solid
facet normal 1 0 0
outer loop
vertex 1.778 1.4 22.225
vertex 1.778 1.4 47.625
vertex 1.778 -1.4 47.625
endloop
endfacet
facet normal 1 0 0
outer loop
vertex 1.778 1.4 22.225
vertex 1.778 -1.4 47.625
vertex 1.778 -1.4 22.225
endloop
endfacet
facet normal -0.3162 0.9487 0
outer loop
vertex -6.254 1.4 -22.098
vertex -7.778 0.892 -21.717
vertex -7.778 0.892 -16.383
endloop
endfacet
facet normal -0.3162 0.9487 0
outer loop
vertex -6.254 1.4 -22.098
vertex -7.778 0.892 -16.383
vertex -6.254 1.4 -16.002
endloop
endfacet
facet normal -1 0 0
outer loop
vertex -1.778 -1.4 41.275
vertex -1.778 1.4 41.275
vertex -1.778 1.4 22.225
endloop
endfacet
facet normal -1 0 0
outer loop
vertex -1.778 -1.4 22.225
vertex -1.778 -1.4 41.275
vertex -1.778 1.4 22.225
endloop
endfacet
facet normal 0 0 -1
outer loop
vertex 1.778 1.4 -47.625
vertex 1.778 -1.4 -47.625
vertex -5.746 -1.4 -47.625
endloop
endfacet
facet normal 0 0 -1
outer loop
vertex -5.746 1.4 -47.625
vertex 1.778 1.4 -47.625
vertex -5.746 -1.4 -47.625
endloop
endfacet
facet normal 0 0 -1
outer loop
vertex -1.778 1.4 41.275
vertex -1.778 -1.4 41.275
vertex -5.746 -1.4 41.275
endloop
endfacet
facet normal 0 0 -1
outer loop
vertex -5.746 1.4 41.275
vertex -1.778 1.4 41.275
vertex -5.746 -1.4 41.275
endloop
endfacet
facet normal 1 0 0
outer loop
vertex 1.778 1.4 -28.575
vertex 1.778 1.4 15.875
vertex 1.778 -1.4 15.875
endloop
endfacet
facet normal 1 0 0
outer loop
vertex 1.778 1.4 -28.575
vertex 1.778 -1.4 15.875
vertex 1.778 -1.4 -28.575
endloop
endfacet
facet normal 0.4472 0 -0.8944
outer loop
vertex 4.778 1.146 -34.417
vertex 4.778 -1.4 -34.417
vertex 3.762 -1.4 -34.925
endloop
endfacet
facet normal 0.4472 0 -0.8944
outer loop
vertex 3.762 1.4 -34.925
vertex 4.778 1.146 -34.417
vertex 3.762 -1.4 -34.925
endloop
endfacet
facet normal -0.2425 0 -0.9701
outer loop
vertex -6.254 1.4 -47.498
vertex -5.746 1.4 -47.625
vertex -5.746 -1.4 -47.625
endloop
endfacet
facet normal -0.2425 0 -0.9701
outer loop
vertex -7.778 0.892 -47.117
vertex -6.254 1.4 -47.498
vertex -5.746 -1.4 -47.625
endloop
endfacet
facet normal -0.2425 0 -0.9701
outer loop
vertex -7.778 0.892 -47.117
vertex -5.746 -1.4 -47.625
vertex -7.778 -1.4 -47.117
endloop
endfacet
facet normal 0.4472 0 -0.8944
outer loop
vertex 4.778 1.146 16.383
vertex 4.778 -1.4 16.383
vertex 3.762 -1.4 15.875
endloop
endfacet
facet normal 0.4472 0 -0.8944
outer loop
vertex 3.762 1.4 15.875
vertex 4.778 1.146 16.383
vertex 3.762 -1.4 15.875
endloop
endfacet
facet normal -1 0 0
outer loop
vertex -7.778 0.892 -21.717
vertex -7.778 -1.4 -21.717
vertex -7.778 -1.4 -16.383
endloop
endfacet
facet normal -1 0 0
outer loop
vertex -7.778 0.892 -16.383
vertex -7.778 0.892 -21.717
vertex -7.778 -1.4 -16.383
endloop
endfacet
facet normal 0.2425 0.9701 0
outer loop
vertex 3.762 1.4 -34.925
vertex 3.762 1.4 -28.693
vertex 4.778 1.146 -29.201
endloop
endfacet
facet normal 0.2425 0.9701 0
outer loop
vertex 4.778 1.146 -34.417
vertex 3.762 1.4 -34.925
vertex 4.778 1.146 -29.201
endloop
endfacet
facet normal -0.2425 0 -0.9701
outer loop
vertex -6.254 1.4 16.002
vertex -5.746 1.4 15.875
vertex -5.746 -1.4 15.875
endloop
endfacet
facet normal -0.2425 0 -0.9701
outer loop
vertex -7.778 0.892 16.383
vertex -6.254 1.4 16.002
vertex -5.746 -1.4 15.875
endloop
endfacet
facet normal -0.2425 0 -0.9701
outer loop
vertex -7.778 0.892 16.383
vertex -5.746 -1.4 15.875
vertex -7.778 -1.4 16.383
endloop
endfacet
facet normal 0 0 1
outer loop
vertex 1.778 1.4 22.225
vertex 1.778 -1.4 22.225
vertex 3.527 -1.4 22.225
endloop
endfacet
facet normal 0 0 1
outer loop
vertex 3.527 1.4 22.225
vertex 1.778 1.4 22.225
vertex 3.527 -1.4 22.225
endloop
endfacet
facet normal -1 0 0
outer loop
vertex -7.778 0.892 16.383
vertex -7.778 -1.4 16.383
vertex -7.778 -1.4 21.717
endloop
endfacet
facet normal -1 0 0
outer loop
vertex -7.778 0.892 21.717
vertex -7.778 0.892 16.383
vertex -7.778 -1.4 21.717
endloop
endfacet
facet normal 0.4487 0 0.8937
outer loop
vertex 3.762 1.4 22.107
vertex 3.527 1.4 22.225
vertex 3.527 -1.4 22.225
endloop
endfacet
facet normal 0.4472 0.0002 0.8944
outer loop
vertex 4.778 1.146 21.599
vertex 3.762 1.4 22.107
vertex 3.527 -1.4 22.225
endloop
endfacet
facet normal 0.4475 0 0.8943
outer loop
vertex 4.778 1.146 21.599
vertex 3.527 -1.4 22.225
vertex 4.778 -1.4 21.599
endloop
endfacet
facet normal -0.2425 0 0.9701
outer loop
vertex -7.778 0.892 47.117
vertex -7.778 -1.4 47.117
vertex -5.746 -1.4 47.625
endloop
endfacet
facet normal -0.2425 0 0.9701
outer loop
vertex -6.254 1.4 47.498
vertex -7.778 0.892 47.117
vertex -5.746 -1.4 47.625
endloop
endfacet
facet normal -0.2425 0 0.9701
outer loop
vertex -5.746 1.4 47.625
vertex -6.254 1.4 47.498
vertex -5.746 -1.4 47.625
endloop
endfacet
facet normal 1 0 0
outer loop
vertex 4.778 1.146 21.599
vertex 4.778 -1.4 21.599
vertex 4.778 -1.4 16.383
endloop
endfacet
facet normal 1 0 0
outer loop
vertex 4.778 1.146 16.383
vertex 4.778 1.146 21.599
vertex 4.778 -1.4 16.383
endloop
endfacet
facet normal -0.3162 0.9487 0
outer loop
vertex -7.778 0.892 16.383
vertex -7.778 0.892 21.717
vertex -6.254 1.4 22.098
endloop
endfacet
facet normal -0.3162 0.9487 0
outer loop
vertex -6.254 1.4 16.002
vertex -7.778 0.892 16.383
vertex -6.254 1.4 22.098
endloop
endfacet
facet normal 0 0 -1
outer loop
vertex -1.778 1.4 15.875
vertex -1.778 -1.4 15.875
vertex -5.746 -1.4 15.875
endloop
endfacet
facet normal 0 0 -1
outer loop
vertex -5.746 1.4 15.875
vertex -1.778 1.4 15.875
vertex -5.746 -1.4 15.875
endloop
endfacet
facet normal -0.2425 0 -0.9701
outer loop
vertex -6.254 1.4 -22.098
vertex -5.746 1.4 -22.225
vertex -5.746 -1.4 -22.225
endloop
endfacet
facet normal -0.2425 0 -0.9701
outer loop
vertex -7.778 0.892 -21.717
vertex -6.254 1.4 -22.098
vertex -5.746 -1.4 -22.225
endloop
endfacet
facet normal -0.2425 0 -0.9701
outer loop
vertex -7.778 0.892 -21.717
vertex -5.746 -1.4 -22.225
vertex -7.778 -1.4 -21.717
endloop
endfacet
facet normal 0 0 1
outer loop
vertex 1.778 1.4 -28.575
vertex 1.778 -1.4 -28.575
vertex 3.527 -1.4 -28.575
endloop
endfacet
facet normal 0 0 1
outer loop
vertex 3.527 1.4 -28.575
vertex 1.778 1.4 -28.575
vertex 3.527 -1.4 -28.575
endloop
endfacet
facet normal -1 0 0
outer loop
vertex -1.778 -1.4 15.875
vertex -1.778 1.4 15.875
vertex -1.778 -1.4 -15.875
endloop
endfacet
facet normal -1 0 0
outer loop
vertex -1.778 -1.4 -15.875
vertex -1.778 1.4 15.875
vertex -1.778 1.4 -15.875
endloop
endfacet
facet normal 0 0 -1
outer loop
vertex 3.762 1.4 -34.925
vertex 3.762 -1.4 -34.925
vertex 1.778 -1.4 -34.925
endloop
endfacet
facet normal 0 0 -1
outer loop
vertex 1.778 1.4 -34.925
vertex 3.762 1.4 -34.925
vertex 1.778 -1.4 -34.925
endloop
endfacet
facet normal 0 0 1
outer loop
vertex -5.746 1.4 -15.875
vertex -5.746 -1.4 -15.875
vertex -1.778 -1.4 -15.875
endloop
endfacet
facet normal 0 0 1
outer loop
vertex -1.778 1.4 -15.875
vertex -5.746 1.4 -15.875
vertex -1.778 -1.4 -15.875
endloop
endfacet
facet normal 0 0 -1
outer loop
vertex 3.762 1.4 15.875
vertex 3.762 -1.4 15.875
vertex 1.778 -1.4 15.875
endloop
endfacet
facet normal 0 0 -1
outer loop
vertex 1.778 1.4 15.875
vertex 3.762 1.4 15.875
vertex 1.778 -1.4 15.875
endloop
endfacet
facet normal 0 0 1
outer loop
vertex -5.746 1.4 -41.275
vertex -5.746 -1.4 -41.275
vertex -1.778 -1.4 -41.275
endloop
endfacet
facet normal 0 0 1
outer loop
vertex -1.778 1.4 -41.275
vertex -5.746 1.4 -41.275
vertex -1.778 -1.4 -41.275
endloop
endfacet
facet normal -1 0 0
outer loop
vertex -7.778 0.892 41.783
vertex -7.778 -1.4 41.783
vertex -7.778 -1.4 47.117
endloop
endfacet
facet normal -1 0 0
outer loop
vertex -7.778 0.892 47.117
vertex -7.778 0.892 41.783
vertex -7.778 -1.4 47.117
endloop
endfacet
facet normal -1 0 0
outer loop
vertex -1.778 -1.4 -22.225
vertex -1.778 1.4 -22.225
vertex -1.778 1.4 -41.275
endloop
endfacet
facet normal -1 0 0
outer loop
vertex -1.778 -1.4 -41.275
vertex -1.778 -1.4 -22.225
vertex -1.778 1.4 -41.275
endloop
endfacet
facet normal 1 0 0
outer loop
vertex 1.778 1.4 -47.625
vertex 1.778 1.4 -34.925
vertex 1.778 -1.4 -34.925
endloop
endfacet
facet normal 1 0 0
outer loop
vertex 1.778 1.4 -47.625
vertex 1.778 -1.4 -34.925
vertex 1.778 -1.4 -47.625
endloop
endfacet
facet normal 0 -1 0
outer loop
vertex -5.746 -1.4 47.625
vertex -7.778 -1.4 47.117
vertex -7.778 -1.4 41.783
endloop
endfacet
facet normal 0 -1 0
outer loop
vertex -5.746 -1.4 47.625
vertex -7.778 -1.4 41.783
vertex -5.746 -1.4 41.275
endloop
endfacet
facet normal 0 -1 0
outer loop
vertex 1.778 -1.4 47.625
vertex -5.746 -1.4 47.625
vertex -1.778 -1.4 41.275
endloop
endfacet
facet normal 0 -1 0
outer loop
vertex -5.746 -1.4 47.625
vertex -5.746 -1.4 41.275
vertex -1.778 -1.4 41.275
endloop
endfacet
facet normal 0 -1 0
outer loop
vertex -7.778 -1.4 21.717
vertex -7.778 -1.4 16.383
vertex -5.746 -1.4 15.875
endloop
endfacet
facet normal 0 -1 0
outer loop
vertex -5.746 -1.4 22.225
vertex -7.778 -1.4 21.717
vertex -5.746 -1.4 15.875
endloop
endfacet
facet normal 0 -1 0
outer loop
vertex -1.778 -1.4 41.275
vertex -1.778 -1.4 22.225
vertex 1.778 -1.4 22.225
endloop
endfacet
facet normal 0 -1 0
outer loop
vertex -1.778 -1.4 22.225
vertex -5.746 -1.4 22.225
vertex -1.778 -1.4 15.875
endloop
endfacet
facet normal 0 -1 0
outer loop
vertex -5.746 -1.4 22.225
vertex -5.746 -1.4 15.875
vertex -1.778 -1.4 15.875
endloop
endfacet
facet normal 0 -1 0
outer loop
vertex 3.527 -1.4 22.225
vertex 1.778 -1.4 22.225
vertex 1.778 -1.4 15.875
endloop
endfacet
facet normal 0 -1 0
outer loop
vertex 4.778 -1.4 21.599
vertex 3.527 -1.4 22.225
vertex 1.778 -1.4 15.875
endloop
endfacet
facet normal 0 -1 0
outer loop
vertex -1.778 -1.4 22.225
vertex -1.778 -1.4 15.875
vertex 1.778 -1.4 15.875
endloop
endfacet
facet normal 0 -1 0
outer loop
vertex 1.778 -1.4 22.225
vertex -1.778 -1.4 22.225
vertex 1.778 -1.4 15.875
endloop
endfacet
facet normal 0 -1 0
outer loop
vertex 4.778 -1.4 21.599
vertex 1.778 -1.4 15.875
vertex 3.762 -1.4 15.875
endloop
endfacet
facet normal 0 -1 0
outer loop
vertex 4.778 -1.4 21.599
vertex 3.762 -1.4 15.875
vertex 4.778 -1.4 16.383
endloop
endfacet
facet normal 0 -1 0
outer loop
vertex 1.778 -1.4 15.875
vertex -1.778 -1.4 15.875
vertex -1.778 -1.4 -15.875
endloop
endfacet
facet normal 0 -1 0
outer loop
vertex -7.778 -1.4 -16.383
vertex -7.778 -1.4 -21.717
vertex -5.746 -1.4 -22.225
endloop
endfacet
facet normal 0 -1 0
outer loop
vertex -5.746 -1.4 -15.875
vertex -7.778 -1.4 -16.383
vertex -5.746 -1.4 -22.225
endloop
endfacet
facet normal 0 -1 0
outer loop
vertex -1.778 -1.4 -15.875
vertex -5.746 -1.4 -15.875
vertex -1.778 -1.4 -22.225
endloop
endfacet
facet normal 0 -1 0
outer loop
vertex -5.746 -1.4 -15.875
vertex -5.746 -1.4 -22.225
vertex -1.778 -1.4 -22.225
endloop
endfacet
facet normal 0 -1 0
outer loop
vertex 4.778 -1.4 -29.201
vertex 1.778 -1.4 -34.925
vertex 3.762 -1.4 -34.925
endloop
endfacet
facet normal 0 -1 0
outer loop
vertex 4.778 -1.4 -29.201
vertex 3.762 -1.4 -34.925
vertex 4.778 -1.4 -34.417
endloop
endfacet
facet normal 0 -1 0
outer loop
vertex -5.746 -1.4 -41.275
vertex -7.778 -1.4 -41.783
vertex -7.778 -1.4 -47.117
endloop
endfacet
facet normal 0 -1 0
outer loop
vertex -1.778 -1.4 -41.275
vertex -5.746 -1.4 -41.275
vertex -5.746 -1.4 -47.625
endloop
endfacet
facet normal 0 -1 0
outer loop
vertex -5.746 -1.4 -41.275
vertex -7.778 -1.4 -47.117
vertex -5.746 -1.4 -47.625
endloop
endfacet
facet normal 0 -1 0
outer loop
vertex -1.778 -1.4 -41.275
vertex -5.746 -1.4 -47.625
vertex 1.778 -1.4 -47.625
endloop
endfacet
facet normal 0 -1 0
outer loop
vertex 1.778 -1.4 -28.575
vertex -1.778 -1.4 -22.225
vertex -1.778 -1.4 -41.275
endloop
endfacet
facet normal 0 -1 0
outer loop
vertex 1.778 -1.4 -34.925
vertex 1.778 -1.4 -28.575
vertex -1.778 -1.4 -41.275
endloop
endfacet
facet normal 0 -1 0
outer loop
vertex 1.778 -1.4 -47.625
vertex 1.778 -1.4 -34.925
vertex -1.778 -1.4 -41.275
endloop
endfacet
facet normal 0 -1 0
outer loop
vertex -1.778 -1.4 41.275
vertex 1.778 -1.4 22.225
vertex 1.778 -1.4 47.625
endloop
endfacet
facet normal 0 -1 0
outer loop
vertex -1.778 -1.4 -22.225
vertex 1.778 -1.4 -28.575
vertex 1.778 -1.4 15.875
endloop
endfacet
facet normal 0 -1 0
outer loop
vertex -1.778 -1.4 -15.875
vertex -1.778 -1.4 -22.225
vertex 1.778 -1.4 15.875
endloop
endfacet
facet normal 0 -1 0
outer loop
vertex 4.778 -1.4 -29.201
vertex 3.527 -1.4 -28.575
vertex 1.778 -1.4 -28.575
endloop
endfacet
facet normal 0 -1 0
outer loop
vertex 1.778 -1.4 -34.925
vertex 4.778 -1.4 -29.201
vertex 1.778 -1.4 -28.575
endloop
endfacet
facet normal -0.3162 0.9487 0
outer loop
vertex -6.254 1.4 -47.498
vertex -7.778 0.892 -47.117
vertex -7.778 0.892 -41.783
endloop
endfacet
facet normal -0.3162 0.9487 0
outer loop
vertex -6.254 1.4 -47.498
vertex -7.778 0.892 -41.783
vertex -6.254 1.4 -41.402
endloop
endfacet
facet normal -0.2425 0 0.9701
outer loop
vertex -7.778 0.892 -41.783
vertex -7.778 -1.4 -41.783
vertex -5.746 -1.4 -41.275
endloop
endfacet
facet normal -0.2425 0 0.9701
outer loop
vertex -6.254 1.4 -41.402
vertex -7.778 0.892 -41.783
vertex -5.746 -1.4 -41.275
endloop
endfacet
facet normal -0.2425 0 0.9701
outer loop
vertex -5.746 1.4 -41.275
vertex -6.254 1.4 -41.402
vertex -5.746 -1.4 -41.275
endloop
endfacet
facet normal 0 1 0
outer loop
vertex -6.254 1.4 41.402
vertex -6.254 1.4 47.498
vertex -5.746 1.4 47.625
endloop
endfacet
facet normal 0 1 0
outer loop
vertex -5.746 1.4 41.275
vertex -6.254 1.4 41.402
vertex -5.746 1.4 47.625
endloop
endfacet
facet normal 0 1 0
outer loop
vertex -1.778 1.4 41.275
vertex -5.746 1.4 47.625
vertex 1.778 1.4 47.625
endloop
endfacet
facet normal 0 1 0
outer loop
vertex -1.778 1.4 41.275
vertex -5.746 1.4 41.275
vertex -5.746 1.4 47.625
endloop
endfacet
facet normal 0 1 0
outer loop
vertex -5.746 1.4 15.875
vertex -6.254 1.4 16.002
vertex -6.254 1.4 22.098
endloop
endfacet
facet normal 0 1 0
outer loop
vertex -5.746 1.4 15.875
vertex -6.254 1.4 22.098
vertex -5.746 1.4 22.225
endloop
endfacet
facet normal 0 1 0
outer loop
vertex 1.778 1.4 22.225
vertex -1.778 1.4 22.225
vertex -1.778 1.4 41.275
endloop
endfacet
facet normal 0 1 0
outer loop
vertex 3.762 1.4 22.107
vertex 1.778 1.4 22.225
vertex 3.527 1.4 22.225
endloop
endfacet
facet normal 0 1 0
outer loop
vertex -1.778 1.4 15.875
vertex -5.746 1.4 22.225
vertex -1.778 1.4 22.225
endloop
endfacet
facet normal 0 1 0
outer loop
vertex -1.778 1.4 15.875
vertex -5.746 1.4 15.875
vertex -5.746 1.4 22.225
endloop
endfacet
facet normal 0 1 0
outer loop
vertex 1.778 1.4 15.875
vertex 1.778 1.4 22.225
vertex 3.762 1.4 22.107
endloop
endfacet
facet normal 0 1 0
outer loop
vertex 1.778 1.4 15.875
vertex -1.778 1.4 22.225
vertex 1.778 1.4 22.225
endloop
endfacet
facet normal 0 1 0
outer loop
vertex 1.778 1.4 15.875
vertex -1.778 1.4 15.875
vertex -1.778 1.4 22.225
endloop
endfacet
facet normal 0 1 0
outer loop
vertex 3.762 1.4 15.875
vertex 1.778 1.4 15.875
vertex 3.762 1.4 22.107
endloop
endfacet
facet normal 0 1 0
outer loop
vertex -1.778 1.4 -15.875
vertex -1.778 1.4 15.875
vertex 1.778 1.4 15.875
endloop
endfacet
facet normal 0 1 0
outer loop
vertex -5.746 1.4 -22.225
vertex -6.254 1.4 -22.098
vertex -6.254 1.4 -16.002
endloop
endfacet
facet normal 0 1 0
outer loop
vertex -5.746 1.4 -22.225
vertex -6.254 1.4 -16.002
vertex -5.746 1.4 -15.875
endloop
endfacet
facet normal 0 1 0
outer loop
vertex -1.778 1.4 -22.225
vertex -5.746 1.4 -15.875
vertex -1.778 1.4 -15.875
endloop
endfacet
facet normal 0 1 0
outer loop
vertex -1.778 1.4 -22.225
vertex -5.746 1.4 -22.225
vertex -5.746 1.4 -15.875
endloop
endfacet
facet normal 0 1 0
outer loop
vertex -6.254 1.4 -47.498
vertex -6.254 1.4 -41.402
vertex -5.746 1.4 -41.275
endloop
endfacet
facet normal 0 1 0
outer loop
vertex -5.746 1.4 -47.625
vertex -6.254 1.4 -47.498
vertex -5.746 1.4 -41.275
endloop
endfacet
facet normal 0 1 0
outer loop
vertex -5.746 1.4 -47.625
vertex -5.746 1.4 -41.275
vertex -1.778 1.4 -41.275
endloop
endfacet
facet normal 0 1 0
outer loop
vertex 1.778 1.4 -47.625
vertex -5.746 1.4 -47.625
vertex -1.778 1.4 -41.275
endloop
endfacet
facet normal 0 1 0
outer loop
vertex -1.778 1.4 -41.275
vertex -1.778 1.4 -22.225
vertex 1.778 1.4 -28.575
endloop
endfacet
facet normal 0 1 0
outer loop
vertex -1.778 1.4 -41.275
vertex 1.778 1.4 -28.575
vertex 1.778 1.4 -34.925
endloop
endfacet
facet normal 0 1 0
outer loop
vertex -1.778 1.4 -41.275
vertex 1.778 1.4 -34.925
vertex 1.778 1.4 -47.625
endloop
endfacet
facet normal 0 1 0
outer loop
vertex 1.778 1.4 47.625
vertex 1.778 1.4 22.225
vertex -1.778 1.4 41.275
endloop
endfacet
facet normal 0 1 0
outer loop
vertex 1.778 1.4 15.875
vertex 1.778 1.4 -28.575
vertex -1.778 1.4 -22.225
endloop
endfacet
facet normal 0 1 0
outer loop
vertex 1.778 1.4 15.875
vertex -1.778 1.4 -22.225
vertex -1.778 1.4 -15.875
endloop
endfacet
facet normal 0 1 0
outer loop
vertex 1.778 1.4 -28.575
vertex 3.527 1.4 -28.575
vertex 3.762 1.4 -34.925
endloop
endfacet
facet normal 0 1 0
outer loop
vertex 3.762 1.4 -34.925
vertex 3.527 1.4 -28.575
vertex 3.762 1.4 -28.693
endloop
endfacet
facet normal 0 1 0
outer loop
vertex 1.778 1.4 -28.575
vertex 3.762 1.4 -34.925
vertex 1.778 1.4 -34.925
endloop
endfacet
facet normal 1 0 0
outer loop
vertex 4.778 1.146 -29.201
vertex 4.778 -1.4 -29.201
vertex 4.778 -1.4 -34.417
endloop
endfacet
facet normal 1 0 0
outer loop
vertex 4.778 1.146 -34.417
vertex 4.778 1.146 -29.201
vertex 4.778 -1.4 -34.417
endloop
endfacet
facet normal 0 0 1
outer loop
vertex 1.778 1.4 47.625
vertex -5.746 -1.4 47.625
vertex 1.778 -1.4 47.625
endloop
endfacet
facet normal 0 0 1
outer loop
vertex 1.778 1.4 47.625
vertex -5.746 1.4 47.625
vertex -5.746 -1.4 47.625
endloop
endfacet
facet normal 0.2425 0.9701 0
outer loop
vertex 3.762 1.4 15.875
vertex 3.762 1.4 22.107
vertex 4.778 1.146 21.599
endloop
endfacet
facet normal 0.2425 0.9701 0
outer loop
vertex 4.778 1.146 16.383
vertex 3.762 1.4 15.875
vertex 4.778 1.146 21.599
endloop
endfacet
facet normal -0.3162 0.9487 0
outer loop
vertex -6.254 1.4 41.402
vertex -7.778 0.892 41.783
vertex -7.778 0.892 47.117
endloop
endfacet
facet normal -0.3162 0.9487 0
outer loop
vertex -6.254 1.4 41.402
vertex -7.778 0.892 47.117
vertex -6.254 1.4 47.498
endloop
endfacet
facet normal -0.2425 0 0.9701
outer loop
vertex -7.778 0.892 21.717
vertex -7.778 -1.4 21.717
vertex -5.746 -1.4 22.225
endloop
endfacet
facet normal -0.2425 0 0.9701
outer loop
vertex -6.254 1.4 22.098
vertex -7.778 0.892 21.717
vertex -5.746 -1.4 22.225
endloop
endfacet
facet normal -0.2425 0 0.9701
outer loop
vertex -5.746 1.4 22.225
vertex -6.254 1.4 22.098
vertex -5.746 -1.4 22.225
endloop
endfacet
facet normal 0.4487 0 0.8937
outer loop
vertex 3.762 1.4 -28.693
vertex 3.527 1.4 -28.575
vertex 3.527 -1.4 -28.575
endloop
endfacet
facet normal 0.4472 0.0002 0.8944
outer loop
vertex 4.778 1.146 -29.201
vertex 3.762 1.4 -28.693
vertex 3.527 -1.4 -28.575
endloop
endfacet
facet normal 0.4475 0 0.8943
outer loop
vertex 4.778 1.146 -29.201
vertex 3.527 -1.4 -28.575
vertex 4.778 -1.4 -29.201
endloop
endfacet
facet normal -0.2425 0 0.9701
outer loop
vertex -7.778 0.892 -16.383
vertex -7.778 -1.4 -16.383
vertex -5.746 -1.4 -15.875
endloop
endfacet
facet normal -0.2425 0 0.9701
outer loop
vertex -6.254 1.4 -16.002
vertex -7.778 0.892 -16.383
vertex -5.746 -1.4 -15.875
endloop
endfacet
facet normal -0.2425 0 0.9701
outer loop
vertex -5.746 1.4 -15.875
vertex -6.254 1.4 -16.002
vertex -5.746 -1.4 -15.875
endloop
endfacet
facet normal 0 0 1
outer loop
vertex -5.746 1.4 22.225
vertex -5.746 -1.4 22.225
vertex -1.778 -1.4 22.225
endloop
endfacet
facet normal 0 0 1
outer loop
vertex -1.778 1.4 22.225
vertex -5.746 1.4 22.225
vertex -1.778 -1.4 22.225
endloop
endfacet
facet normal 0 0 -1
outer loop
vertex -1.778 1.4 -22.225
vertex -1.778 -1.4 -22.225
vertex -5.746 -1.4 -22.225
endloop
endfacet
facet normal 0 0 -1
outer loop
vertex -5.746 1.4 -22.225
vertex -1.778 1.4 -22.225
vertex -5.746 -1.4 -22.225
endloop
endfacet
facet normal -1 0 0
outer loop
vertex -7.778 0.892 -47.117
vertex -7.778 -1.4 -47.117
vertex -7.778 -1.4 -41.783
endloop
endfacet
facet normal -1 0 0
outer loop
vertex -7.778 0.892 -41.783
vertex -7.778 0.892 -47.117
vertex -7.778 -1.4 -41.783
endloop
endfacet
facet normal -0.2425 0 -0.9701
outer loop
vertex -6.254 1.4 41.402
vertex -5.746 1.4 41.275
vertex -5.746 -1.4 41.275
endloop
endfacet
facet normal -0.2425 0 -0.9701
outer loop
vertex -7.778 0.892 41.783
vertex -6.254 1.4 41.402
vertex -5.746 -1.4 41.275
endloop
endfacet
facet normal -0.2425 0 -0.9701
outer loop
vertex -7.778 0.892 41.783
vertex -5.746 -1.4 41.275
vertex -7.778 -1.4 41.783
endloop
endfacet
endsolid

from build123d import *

# Parameters (mm, degrees)
SKETCH1_W               = 3.556
SKETCH1_H               = 95.25
BOSS_EXTRUDE1_DEPTH     = 1.399999994
BOSS_EXTRUDE2_START     = -2.799999988
BOSS_EXTRUDE2_DEPTH     = 2.799999988
CUT_EXTRUDE1_DEPTH      = 96.57729743
CUT_EXTRUDE1_DEPTH_BACK = 96.57729743


# Read off the part's stored shape, not the designer's step: Boss-Extrude2
with BuildPart() as part:
    # Sketch1 → Boss-Extrude1 (new, symmetric)
    with BuildSketch(Plane(origin=(0, 0, 0), x_dir=(1, 0, 0), z_dir=(0, 1, 0))):
        Rectangle(SKETCH1_W, SKETCH1_H)
    extrude(amount=BOSS_EXTRUDE1_DEPTH, both=True)

    # Boss-Extrude2 outline → Boss-Extrude2 (add)
    with BuildSketch(Plane(origin=(0, 1.399999994, 0), x_dir=(1, 0, 0), z_dir=(0, 1, 0)).offset(BOSS_EXTRUDE2_START)):
        Polygon((-1.778, 47.625), (-5.746, 47.625), (-7.778, 47.117), (-7.778, 41.783), (-5.746, 41.275), (-1.778, 41.275), align=None)
        Polygon((3.762000096, 34.925), (1.778, 34.925), (1.778, 28.575), (3.526821698, 28.575), (4.778000096, 29.200589199), (4.778000096, 34.417), align=None)
        Polygon((-1.778, 15.875), (-1.778, 22.225), (-5.746, 22.225), (-7.778, 21.717), (-7.778, 16.383), (-5.746, 15.875), align=None)
        Polygon((3.762000096, -15.875), (1.778, -15.875), (1.778, -22.225), (3.526821698, -22.225), (4.778000096, -21.599410801), (4.778000096, -16.383), align=None)
        Polygon((-1.778, -22.225), (-1.778, -15.875), (-5.746, -15.875), (-7.778, -16.383), (-7.778, -21.717), (-5.746, -22.225), align=None)
        Polygon((-1.778, -47.625), (-1.778, -41.275), (-5.746, -41.275), (-7.778, -41.783), (-7.778, -47.117), (-5.746, -47.625), align=None)
    extrude(amount=BOSS_EXTRUDE2_DEPTH)

    # Sketch3 → Cut-Extrude1 (cut, two sides: drawn at the far end of the back side and taken through both)
    with BuildSketch(Plane.XY.offset(47.625).offset(-CUT_EXTRUDE1_DEPTH_BACK)):
        Polygon((-7.778, 0.891999994), (-6.254, 1.399999994), (-7.778, 1.399999994), align=None)
        Polygon((4.778000096, 1.145999994), (4.778000096, 1.399999994), (3.762000096, 1.399999994), align=None)
    extrude(amount=CUT_EXTRUDE1_DEPTH + CUT_EXTRUDE1_DEPTH_BACK, mode=Mode.SUBTRACT)


solid = part.part
